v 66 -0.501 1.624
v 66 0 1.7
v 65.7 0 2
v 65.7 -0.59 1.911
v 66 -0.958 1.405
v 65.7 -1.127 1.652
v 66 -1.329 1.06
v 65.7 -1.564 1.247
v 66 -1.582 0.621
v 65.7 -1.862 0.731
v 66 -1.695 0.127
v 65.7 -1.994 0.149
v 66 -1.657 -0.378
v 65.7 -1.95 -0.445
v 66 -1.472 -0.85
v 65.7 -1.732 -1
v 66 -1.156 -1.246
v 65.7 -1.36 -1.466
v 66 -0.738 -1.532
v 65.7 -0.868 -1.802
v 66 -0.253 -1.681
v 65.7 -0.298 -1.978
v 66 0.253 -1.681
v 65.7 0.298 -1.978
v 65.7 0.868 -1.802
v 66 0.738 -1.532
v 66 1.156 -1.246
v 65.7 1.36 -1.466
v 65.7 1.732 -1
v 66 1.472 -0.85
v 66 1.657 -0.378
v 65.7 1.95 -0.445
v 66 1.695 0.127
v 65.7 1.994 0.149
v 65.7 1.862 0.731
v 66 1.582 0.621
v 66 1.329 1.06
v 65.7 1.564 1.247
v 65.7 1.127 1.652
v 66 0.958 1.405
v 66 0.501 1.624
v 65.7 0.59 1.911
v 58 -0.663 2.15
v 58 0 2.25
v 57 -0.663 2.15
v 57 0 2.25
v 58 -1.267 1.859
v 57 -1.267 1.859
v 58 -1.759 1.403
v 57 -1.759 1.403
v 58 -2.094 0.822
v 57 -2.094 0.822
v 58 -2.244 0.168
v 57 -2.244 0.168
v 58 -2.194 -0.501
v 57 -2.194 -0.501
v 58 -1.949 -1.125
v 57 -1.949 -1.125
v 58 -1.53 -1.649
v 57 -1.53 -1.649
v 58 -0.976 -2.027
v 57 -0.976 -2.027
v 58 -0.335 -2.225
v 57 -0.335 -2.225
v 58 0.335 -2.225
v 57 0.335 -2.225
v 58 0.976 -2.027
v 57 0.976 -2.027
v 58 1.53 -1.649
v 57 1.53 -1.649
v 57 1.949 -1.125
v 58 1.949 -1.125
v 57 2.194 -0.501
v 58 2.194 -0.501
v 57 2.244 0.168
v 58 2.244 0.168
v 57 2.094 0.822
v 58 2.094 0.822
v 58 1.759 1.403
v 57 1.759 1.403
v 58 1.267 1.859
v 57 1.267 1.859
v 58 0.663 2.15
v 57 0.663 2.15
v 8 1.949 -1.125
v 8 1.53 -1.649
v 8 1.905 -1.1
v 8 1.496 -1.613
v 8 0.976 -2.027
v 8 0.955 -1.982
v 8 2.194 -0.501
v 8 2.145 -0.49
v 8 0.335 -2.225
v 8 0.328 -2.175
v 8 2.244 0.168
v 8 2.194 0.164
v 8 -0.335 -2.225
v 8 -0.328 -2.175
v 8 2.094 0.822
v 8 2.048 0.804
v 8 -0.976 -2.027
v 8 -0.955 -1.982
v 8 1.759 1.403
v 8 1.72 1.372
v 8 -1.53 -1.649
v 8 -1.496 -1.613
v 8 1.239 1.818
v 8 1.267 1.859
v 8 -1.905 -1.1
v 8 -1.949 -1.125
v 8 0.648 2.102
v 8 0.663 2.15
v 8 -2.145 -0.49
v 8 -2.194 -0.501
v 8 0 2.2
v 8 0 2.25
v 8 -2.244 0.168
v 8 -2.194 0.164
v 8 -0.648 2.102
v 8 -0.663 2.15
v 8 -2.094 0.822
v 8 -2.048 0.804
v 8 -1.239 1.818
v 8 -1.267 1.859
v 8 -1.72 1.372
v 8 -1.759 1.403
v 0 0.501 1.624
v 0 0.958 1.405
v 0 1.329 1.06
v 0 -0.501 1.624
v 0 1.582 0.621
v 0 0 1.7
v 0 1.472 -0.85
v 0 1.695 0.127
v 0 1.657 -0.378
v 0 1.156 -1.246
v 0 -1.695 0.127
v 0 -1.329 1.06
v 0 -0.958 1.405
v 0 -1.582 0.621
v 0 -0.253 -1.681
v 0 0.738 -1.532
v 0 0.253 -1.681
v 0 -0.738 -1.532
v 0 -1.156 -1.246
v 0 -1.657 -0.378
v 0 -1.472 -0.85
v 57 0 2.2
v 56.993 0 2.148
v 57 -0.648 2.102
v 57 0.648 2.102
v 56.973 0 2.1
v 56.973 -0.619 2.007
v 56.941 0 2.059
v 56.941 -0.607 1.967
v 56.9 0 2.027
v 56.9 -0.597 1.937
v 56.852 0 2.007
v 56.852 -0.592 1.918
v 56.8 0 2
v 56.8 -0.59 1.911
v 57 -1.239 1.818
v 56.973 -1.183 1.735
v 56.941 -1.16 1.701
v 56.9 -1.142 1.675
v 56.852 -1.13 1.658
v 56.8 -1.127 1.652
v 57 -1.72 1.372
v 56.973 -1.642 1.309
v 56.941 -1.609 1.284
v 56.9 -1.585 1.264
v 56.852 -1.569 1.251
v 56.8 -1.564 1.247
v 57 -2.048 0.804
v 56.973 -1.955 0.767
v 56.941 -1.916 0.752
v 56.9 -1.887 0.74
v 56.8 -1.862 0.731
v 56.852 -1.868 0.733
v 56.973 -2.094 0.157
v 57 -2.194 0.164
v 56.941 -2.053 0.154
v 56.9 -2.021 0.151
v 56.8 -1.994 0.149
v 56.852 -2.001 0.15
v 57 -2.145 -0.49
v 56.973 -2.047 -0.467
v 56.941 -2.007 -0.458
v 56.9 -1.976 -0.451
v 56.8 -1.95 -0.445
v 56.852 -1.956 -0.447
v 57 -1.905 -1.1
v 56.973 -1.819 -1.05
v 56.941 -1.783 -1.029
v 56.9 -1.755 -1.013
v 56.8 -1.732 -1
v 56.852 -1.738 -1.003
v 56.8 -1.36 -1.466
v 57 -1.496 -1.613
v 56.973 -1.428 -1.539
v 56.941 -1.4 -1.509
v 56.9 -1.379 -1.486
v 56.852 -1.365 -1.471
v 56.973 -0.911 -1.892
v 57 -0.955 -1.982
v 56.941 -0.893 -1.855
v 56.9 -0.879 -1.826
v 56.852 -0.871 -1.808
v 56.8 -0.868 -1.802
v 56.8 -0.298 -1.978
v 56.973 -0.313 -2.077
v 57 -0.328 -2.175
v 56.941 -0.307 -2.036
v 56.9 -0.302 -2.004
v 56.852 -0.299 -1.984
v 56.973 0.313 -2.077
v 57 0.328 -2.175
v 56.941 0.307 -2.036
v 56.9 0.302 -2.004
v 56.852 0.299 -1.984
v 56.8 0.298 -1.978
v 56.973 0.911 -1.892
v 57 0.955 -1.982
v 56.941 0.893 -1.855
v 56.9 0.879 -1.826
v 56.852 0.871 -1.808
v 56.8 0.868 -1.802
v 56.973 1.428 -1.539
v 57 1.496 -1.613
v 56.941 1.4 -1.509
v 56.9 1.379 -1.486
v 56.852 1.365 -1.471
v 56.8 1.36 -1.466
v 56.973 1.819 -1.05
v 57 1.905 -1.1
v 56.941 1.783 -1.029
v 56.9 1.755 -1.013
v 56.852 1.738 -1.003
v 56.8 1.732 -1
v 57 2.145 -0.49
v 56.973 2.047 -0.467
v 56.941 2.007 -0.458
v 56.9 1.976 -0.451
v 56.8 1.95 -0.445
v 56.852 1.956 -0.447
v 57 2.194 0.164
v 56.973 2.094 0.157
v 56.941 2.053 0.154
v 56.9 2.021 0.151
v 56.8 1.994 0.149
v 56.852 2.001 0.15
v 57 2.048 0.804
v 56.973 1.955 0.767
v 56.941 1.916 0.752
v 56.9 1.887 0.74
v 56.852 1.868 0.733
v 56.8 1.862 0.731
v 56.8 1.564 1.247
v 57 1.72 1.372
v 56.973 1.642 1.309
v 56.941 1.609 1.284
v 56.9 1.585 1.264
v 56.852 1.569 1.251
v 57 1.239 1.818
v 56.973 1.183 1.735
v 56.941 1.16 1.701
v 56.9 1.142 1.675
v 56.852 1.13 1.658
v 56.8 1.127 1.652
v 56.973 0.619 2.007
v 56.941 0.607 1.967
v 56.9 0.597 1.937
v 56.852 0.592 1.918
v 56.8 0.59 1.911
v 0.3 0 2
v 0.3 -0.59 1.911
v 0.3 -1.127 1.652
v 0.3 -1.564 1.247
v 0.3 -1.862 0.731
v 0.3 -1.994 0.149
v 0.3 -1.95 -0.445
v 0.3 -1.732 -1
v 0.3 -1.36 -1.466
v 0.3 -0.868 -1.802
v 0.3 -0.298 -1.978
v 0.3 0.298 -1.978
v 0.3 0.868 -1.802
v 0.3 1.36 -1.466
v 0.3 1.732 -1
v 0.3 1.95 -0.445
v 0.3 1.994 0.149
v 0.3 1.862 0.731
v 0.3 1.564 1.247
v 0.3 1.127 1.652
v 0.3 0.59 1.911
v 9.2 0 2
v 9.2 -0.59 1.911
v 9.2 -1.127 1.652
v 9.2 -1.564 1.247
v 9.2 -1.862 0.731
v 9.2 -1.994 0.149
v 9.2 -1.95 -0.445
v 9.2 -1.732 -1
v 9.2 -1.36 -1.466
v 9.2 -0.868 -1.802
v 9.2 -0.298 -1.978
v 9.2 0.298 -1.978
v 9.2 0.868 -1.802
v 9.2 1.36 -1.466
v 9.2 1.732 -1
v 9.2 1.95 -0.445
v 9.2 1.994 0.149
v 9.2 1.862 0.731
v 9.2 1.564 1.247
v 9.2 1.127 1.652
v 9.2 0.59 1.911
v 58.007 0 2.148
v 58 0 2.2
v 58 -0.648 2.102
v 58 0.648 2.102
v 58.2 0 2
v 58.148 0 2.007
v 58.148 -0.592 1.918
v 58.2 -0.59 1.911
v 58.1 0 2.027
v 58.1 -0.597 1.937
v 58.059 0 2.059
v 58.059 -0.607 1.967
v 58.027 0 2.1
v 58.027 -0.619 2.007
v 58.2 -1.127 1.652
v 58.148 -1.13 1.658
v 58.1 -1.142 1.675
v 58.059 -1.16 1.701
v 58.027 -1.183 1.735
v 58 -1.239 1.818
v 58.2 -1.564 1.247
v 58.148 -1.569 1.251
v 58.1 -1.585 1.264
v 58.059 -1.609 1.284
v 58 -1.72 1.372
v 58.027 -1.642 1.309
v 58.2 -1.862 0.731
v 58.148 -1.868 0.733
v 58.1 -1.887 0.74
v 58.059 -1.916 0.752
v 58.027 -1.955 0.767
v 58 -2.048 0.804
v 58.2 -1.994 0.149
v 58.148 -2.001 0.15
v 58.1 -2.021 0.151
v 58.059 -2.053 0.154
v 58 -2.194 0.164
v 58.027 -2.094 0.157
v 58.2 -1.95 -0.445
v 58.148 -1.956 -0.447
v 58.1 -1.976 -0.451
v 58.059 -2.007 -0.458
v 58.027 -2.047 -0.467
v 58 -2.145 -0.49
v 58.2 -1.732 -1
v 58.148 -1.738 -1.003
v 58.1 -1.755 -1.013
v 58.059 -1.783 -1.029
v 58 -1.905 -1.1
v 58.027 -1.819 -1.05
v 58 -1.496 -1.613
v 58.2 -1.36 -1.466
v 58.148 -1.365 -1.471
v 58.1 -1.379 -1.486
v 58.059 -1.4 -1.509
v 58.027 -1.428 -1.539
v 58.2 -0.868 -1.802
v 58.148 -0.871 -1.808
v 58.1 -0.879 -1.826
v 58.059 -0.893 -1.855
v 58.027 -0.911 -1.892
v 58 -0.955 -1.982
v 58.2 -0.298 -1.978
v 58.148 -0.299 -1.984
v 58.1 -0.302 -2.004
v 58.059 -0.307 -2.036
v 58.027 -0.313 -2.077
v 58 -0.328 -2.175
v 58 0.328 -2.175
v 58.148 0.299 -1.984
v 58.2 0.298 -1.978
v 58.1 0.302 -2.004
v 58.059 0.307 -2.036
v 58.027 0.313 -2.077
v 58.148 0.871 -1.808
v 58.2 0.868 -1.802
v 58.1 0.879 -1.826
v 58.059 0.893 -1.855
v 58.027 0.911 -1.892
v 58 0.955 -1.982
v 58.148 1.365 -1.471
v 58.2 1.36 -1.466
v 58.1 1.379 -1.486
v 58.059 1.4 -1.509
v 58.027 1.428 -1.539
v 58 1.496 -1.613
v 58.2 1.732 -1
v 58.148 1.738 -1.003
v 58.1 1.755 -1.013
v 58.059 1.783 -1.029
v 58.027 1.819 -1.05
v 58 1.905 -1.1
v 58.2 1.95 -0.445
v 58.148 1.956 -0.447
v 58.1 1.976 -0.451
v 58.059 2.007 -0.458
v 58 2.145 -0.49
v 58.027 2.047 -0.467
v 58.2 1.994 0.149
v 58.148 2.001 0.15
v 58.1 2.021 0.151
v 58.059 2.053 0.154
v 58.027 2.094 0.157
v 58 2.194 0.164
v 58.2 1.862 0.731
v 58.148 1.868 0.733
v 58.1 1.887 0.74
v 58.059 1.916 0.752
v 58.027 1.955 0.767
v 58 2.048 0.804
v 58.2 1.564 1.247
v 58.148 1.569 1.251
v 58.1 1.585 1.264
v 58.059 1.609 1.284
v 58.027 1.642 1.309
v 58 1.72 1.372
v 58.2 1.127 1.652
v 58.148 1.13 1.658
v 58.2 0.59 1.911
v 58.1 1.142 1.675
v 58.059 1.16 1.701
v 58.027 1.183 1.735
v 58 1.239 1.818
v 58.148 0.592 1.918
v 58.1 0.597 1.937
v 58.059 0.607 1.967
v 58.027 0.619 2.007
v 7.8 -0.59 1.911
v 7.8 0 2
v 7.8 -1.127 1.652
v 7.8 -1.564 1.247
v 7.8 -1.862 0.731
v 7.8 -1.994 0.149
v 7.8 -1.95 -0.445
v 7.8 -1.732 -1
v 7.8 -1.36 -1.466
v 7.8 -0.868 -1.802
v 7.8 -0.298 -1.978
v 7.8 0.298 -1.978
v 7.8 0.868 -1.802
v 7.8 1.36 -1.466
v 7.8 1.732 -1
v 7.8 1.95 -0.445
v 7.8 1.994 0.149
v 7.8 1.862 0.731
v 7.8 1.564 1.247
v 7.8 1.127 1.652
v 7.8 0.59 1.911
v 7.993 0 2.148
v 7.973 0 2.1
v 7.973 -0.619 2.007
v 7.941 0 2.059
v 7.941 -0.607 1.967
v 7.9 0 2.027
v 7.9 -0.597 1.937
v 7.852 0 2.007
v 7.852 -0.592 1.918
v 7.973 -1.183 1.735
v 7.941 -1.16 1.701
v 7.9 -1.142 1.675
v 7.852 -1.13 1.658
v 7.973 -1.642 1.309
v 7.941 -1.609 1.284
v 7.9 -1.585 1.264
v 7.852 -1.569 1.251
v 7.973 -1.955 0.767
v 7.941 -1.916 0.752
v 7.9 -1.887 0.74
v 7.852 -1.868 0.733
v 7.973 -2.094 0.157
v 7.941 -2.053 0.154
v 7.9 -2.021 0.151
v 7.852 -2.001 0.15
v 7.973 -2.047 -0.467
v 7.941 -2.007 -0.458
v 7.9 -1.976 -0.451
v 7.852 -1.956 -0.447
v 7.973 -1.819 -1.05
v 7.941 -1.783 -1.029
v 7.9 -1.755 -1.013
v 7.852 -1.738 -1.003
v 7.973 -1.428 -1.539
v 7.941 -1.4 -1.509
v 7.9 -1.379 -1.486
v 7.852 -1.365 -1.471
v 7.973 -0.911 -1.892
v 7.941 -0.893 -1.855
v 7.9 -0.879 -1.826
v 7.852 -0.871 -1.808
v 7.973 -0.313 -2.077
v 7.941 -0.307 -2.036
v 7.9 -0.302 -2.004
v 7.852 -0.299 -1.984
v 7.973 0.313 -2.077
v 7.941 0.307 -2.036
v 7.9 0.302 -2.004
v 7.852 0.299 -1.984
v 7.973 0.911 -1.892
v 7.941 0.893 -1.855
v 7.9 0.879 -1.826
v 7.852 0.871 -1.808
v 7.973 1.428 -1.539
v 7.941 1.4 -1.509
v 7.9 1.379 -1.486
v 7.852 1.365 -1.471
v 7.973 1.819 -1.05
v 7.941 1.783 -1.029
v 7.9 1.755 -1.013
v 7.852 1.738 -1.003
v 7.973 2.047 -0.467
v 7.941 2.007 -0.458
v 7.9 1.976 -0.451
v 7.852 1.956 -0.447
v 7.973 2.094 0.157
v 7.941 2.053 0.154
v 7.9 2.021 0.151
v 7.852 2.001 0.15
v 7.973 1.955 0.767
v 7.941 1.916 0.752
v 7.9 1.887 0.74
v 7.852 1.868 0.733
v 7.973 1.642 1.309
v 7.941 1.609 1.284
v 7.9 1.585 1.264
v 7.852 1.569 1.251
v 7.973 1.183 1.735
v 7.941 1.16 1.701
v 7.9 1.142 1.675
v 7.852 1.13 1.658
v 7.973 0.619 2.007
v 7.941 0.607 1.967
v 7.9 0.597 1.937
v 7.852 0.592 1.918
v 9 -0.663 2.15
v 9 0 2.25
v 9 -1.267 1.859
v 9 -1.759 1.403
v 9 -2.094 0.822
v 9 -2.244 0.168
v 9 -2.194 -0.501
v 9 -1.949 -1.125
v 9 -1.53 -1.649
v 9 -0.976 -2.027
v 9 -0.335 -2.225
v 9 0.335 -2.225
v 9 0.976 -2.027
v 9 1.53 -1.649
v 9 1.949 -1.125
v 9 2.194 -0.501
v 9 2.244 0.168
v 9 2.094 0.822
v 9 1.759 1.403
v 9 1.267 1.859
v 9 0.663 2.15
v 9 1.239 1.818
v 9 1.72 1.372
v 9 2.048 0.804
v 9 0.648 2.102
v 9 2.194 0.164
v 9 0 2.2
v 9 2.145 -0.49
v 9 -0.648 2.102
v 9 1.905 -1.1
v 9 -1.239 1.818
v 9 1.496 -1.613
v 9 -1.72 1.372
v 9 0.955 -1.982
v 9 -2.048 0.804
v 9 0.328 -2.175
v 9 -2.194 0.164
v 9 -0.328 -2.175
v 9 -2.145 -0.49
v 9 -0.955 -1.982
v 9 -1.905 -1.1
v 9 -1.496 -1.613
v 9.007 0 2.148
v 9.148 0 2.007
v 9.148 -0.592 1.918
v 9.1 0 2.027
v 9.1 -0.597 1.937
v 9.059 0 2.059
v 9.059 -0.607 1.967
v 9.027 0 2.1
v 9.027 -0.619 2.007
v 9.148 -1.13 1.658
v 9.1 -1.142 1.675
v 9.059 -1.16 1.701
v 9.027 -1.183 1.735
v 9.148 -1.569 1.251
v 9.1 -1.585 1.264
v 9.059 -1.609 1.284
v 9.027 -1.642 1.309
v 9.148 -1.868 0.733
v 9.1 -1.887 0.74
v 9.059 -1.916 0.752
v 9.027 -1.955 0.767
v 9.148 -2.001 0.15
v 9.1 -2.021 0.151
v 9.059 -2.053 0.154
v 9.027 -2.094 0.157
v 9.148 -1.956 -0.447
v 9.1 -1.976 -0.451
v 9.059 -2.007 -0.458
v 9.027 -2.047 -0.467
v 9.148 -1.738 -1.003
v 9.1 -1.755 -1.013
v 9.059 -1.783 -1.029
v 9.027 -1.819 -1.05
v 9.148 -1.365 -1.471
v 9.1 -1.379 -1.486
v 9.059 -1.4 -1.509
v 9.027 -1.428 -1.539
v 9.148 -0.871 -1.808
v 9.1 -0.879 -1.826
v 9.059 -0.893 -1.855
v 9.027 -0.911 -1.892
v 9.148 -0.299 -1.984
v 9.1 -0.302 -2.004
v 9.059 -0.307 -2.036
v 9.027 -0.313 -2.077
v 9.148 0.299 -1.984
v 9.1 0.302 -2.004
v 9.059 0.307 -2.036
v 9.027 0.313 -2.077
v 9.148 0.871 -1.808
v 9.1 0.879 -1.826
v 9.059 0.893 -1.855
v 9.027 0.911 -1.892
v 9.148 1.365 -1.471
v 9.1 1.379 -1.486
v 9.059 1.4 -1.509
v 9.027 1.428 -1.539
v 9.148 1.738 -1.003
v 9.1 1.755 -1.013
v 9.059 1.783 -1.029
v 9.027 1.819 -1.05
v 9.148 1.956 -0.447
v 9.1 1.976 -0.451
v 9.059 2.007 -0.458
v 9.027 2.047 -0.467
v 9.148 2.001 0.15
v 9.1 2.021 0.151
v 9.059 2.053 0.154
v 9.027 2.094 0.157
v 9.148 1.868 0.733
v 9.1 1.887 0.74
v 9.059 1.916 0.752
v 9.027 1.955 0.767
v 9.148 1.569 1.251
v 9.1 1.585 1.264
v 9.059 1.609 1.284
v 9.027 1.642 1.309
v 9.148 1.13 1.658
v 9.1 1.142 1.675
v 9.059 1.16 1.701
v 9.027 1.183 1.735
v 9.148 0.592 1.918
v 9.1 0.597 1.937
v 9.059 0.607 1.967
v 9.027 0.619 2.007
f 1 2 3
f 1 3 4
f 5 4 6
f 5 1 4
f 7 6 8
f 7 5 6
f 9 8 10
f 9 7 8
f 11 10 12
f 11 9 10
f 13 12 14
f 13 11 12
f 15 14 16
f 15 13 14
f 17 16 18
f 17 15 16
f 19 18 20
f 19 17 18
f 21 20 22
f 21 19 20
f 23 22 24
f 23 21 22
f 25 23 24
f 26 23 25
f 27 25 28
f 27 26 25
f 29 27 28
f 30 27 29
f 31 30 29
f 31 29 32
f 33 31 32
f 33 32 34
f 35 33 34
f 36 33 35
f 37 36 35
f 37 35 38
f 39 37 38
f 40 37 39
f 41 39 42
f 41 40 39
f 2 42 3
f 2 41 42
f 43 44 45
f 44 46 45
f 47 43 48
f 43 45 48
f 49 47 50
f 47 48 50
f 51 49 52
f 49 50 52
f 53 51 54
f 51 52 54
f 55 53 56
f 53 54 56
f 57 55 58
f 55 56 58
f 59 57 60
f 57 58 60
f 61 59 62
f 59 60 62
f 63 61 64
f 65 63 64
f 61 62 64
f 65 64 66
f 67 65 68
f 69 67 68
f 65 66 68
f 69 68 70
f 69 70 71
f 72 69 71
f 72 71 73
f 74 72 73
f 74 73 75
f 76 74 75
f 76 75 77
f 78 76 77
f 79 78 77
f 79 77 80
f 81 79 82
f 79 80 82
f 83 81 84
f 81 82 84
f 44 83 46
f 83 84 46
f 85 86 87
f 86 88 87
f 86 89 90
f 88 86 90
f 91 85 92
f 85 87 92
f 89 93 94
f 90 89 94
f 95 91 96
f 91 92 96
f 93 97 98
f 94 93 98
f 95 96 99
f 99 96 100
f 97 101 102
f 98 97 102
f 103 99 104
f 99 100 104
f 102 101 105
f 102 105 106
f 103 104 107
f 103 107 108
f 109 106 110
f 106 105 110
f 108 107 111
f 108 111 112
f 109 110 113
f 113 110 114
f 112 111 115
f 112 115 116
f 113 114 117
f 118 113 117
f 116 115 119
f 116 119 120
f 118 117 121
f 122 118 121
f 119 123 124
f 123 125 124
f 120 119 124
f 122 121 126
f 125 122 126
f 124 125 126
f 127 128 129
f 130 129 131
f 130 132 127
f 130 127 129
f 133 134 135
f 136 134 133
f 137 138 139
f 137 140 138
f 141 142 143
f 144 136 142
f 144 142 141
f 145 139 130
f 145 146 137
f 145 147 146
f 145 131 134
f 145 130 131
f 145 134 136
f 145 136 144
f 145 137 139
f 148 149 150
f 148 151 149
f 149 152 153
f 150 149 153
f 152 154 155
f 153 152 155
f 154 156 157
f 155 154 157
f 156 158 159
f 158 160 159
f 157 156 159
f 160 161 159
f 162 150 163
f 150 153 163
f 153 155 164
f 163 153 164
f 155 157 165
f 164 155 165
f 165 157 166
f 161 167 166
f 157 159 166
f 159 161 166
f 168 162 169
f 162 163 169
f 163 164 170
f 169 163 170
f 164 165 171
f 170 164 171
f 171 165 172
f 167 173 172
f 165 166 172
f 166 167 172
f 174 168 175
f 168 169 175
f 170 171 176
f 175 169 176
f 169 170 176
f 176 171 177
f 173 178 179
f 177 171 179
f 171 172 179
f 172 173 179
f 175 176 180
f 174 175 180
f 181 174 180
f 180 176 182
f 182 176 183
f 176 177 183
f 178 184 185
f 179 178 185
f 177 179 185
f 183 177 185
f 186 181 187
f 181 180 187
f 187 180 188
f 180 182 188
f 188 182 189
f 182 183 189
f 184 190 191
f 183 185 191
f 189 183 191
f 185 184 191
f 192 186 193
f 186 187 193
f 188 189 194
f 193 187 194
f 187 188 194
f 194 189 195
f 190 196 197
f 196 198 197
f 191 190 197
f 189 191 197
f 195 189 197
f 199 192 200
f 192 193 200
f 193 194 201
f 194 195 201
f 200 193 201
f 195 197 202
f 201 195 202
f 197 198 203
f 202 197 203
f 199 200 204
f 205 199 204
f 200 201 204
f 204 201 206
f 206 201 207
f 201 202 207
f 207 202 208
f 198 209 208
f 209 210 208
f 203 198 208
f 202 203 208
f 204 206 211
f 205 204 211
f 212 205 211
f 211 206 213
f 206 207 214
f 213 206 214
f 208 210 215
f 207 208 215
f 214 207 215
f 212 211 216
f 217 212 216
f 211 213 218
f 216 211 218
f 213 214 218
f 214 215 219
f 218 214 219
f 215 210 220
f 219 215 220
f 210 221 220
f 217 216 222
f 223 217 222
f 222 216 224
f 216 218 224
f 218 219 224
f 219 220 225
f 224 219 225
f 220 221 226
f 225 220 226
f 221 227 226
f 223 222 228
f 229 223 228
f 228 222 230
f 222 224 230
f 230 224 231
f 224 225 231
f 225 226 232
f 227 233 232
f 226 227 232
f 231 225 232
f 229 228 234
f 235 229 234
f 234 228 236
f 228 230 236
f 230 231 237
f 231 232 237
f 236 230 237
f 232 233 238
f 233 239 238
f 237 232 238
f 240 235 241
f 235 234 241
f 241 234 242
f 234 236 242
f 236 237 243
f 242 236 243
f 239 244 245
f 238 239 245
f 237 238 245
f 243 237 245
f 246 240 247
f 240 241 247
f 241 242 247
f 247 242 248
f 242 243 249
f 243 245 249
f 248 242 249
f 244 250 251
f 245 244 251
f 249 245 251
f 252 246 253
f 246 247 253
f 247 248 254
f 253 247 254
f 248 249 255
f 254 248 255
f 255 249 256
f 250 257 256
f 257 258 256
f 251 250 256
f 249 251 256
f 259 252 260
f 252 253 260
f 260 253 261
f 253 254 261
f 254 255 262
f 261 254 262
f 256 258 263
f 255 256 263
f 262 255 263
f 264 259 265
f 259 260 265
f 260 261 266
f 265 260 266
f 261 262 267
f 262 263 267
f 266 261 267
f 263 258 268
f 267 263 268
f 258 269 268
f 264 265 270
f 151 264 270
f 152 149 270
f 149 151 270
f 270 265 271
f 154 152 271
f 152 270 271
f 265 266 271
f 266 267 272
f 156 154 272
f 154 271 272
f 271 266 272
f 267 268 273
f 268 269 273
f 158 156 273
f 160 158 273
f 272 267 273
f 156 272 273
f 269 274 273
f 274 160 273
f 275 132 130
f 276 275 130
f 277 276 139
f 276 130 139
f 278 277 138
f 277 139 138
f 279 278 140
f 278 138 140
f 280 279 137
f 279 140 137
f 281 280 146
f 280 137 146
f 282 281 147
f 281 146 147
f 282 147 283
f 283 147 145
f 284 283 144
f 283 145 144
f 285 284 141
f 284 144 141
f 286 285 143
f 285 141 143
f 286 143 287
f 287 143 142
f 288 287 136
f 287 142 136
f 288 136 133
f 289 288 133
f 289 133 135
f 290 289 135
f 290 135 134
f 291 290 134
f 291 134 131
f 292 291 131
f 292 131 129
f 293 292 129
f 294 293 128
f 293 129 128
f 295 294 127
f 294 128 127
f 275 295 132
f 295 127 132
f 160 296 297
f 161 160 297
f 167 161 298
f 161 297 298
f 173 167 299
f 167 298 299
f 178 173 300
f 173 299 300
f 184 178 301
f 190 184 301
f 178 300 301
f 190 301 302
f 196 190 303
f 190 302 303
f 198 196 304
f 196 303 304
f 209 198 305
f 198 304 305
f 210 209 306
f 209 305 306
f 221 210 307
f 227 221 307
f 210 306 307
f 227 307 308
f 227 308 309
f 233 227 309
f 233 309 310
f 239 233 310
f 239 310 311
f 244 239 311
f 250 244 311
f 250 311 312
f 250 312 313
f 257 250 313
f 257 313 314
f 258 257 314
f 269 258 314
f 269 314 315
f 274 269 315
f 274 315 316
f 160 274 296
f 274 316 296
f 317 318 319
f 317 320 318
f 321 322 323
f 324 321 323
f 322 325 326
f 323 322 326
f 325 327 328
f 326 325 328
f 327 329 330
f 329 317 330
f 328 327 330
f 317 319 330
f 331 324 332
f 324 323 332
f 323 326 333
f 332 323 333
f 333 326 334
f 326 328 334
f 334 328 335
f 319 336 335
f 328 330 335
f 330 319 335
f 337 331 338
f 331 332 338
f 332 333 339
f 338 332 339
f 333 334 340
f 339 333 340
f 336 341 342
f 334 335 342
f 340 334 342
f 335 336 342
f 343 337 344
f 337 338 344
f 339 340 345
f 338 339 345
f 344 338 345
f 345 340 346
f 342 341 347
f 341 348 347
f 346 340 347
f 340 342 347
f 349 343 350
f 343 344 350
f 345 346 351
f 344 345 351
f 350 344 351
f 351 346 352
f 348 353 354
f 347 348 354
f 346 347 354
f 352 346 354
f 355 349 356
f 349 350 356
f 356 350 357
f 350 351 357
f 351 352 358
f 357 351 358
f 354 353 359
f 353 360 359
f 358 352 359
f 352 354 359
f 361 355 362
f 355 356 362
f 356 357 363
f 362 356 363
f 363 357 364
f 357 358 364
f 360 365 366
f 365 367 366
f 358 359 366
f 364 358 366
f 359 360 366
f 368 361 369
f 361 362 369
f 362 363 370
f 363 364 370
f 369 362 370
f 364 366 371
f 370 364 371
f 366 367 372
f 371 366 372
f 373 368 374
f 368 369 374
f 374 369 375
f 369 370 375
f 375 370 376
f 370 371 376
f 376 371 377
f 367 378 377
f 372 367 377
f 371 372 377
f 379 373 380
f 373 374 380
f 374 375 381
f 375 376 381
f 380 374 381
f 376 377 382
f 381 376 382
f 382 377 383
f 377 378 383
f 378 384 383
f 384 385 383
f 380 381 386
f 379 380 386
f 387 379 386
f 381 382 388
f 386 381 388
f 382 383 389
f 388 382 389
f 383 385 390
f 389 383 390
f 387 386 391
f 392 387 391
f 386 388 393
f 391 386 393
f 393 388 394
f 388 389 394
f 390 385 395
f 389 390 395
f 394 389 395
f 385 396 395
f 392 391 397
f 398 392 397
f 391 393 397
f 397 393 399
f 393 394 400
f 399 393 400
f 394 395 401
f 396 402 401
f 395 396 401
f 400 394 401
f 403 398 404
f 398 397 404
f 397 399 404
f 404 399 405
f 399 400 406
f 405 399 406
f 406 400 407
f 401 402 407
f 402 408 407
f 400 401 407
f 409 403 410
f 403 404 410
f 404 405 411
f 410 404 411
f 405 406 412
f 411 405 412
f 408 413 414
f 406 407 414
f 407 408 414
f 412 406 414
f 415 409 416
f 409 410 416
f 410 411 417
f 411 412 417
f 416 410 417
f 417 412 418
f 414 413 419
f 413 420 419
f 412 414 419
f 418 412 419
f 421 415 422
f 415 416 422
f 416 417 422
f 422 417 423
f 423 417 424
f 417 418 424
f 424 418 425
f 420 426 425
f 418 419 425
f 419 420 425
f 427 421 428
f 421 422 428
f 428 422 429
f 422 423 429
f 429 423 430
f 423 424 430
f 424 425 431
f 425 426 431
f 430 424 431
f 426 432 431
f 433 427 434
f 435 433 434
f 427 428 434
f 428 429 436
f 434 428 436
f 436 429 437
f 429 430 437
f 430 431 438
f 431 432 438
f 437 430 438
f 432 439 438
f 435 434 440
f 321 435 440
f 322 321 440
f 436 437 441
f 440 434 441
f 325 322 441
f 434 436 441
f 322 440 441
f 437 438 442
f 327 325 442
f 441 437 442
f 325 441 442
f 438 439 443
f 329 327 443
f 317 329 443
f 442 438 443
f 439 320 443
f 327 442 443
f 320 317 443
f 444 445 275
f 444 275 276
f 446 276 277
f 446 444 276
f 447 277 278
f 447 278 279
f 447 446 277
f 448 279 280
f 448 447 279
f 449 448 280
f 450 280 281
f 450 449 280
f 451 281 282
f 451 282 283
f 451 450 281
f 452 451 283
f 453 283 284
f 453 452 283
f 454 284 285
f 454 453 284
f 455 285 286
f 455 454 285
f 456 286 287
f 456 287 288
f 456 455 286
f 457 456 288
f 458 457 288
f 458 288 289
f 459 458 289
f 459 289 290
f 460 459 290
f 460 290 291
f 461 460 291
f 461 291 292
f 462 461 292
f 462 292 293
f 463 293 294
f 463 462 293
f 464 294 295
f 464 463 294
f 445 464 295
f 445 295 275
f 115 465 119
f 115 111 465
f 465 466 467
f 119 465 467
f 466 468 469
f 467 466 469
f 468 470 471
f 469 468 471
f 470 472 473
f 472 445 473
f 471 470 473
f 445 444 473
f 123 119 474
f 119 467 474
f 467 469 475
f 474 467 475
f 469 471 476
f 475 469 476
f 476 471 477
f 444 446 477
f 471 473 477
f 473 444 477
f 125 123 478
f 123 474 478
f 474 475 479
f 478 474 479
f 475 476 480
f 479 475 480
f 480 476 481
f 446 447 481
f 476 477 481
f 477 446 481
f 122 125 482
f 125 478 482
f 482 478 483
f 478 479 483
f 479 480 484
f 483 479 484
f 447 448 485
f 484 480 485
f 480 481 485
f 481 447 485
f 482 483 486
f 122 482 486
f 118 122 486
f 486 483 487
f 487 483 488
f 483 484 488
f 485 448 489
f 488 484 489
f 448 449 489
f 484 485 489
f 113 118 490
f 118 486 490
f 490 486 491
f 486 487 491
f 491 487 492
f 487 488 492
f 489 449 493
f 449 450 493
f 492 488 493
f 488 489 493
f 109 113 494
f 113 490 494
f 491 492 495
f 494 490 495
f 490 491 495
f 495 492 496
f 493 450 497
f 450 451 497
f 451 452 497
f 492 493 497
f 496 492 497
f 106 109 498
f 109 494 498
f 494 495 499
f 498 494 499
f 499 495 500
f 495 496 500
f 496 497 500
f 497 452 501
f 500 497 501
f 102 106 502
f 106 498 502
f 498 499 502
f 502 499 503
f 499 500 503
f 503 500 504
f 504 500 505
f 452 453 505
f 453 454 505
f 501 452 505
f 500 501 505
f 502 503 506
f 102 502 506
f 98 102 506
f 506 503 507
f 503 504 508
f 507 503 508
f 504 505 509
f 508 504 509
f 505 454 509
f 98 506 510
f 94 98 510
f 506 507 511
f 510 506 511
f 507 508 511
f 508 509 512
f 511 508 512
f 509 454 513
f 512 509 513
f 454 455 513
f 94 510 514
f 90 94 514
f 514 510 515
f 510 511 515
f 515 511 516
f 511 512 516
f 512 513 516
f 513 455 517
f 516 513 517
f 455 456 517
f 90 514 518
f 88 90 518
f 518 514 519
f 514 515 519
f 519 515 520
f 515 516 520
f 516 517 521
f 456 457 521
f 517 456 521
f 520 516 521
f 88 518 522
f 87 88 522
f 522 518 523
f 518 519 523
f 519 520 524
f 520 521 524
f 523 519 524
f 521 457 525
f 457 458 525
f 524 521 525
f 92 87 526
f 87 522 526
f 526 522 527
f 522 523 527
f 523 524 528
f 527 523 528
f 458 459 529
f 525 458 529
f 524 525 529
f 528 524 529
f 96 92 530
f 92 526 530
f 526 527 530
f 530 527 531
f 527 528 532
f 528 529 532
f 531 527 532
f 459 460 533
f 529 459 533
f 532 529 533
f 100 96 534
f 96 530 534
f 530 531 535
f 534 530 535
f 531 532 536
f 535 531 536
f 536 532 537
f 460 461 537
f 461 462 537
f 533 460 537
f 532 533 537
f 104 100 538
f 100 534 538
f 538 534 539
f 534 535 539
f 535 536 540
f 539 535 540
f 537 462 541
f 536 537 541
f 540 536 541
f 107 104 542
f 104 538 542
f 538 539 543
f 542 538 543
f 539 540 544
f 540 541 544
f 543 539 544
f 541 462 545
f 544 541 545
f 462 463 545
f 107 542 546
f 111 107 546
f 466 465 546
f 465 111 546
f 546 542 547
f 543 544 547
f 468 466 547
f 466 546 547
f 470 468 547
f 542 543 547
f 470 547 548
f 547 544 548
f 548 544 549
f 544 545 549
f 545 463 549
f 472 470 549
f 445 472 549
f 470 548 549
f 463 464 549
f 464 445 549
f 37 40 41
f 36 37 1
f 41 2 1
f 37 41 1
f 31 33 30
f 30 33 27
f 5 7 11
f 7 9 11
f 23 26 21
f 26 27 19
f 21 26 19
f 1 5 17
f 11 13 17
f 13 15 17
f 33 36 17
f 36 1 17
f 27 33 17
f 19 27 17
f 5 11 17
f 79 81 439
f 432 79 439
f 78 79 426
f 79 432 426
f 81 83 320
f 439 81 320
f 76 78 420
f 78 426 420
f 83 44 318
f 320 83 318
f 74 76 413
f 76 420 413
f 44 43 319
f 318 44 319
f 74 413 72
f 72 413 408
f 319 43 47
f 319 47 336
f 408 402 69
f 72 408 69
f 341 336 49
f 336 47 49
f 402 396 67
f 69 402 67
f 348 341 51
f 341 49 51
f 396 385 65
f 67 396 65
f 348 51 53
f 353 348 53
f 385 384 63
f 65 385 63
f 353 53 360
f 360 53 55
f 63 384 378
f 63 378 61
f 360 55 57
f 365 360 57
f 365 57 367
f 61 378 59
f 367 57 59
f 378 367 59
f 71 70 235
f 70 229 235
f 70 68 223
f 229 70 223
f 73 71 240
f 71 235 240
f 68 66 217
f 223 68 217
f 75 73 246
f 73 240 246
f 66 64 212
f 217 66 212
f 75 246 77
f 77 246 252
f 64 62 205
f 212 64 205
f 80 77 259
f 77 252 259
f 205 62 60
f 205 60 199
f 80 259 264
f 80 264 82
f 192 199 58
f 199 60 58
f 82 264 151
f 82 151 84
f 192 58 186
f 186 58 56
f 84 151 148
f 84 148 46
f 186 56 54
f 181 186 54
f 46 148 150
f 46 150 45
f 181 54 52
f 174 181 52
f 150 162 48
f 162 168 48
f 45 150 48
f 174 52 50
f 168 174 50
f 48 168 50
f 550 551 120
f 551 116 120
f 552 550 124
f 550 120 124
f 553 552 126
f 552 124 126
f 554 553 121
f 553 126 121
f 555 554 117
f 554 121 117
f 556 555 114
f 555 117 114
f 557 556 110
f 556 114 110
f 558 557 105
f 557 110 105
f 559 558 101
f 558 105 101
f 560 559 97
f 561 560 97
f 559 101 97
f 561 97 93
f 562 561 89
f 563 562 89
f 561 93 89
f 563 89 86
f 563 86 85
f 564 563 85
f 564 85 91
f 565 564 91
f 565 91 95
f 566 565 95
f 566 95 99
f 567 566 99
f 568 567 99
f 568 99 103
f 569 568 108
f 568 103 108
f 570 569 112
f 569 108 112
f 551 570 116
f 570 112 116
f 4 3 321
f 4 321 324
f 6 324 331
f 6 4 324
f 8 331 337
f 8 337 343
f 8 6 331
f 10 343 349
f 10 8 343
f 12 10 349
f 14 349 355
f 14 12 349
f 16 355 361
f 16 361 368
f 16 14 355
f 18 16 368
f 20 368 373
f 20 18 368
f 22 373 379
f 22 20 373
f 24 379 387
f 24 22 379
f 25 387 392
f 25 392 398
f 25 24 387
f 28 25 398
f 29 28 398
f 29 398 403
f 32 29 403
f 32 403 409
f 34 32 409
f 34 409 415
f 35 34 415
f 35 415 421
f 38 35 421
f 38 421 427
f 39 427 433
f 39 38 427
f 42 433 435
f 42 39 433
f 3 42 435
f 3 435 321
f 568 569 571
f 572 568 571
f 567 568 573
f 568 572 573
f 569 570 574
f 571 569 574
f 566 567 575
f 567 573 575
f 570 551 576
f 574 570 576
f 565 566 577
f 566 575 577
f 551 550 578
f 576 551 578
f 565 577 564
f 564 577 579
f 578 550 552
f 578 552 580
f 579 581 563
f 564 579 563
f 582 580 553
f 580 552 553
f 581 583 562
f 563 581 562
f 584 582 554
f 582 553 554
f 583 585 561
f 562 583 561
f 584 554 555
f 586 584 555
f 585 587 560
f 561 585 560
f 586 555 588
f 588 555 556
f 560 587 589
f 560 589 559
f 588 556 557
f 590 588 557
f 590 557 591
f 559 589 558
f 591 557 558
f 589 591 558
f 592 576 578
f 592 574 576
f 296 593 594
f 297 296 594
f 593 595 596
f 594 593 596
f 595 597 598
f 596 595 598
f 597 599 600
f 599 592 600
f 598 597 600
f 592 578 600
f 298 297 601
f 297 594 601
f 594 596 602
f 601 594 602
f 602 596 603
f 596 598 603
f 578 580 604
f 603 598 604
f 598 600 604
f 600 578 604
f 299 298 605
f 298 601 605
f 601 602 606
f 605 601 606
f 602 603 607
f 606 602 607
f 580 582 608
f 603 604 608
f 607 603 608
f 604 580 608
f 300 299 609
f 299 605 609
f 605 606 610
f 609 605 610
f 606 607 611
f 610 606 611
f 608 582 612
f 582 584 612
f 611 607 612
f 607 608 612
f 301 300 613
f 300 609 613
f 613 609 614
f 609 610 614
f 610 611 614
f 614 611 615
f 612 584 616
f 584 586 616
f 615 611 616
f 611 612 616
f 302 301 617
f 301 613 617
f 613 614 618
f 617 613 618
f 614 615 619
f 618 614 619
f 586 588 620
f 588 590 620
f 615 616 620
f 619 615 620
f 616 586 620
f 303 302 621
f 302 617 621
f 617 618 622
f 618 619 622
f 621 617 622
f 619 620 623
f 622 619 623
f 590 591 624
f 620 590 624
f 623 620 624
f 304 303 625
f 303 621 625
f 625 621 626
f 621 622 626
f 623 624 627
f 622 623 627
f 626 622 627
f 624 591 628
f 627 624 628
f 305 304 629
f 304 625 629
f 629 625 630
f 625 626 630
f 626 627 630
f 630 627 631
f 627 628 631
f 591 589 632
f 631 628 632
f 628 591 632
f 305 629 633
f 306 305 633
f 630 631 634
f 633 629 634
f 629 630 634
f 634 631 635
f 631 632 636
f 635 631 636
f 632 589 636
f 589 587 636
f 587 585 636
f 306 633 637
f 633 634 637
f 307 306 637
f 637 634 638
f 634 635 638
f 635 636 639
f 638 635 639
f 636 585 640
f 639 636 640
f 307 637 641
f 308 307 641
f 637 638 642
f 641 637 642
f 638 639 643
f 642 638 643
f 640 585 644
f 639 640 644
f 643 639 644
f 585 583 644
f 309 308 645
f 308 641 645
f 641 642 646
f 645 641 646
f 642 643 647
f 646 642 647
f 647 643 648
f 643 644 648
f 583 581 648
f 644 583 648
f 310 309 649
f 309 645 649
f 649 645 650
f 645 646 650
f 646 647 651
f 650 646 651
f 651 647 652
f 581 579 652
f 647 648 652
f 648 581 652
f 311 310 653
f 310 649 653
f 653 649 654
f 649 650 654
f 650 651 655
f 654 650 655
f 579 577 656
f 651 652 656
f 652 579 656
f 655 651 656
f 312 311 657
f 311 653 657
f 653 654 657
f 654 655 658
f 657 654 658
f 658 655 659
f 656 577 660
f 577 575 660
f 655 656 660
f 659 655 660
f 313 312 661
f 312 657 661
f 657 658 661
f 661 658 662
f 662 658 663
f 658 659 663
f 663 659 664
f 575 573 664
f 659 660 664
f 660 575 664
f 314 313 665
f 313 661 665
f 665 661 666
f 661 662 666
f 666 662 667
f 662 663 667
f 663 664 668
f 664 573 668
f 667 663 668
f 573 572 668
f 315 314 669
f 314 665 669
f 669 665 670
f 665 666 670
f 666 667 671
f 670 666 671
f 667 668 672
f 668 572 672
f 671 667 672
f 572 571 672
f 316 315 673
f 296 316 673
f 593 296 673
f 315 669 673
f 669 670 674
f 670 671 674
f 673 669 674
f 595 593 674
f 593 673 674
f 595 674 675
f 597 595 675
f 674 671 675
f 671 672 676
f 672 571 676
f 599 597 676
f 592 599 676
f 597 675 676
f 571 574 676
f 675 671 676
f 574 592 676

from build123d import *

# Parameters (mm, degrees)
SKETCH2_W     = 8
SKETCH2_H     = 2
SKETCH2_W_2   = 24
FILLET1_R     = 0.2
CHAMFER1_SIZE = 0.3


with BuildPart() as part:
    # Sketch2 → Revolve1 (revolve)
    with BuildSketch(Plane.XY, mode=Mode.PRIVATE) as revolve1_sk:
        with Locations((4, 1)):
            Rectangle(SKETCH2_W, SKETCH2_H)
        with Locations((14, 1)):
            Rectangle(SKETCH2_W, SKETCH2_H)
        Polygon((8, 2.25), (8, 2), (8, 0), (10, 0), (10, 2), (9, 2), (9, 2.25), align=None)
        with Locations((30, 1)):
            Rectangle(SKETCH2_W_2, SKETCH2_H)
        with Locations((46, 1)):
            Rectangle(SKETCH2_W, SKETCH2_H)
        Polygon((50, 2), (50, 0), (58, 0), (58, 2), (58, 2.25), (57, 2.25), (57, 2), align=None)
        with Locations((62, 1)):
            Rectangle(SKETCH2_W, SKETCH2_H)
    revolve(revolve1_sk.sketch.rotate(Axis((0, 0, 0), (1, 0, 0)), 90), axis=Axis((0, 0, 0), (1, 0, 0)))

    # Fillet1
    fillet1_edges = [part.edges().sort_by_distance(p)[0] for p in [
        (8, 0, -2),
        (9, 0, -2),
        (57, 0, -2),
        (58, 0, -2),
    ]]
    fillet(fillet1_edges, radius=FILLET1_R)

    # Chamfer1
    chamfer1_edges = [part.edges().sort_by_distance(p)[0] for p in [
        (0, 0, -2),
        (66, 0, -2),
    ]]
    chamfer(chamfer1_edges, length=CHAMFER1_SIZE)


solid = part.part
